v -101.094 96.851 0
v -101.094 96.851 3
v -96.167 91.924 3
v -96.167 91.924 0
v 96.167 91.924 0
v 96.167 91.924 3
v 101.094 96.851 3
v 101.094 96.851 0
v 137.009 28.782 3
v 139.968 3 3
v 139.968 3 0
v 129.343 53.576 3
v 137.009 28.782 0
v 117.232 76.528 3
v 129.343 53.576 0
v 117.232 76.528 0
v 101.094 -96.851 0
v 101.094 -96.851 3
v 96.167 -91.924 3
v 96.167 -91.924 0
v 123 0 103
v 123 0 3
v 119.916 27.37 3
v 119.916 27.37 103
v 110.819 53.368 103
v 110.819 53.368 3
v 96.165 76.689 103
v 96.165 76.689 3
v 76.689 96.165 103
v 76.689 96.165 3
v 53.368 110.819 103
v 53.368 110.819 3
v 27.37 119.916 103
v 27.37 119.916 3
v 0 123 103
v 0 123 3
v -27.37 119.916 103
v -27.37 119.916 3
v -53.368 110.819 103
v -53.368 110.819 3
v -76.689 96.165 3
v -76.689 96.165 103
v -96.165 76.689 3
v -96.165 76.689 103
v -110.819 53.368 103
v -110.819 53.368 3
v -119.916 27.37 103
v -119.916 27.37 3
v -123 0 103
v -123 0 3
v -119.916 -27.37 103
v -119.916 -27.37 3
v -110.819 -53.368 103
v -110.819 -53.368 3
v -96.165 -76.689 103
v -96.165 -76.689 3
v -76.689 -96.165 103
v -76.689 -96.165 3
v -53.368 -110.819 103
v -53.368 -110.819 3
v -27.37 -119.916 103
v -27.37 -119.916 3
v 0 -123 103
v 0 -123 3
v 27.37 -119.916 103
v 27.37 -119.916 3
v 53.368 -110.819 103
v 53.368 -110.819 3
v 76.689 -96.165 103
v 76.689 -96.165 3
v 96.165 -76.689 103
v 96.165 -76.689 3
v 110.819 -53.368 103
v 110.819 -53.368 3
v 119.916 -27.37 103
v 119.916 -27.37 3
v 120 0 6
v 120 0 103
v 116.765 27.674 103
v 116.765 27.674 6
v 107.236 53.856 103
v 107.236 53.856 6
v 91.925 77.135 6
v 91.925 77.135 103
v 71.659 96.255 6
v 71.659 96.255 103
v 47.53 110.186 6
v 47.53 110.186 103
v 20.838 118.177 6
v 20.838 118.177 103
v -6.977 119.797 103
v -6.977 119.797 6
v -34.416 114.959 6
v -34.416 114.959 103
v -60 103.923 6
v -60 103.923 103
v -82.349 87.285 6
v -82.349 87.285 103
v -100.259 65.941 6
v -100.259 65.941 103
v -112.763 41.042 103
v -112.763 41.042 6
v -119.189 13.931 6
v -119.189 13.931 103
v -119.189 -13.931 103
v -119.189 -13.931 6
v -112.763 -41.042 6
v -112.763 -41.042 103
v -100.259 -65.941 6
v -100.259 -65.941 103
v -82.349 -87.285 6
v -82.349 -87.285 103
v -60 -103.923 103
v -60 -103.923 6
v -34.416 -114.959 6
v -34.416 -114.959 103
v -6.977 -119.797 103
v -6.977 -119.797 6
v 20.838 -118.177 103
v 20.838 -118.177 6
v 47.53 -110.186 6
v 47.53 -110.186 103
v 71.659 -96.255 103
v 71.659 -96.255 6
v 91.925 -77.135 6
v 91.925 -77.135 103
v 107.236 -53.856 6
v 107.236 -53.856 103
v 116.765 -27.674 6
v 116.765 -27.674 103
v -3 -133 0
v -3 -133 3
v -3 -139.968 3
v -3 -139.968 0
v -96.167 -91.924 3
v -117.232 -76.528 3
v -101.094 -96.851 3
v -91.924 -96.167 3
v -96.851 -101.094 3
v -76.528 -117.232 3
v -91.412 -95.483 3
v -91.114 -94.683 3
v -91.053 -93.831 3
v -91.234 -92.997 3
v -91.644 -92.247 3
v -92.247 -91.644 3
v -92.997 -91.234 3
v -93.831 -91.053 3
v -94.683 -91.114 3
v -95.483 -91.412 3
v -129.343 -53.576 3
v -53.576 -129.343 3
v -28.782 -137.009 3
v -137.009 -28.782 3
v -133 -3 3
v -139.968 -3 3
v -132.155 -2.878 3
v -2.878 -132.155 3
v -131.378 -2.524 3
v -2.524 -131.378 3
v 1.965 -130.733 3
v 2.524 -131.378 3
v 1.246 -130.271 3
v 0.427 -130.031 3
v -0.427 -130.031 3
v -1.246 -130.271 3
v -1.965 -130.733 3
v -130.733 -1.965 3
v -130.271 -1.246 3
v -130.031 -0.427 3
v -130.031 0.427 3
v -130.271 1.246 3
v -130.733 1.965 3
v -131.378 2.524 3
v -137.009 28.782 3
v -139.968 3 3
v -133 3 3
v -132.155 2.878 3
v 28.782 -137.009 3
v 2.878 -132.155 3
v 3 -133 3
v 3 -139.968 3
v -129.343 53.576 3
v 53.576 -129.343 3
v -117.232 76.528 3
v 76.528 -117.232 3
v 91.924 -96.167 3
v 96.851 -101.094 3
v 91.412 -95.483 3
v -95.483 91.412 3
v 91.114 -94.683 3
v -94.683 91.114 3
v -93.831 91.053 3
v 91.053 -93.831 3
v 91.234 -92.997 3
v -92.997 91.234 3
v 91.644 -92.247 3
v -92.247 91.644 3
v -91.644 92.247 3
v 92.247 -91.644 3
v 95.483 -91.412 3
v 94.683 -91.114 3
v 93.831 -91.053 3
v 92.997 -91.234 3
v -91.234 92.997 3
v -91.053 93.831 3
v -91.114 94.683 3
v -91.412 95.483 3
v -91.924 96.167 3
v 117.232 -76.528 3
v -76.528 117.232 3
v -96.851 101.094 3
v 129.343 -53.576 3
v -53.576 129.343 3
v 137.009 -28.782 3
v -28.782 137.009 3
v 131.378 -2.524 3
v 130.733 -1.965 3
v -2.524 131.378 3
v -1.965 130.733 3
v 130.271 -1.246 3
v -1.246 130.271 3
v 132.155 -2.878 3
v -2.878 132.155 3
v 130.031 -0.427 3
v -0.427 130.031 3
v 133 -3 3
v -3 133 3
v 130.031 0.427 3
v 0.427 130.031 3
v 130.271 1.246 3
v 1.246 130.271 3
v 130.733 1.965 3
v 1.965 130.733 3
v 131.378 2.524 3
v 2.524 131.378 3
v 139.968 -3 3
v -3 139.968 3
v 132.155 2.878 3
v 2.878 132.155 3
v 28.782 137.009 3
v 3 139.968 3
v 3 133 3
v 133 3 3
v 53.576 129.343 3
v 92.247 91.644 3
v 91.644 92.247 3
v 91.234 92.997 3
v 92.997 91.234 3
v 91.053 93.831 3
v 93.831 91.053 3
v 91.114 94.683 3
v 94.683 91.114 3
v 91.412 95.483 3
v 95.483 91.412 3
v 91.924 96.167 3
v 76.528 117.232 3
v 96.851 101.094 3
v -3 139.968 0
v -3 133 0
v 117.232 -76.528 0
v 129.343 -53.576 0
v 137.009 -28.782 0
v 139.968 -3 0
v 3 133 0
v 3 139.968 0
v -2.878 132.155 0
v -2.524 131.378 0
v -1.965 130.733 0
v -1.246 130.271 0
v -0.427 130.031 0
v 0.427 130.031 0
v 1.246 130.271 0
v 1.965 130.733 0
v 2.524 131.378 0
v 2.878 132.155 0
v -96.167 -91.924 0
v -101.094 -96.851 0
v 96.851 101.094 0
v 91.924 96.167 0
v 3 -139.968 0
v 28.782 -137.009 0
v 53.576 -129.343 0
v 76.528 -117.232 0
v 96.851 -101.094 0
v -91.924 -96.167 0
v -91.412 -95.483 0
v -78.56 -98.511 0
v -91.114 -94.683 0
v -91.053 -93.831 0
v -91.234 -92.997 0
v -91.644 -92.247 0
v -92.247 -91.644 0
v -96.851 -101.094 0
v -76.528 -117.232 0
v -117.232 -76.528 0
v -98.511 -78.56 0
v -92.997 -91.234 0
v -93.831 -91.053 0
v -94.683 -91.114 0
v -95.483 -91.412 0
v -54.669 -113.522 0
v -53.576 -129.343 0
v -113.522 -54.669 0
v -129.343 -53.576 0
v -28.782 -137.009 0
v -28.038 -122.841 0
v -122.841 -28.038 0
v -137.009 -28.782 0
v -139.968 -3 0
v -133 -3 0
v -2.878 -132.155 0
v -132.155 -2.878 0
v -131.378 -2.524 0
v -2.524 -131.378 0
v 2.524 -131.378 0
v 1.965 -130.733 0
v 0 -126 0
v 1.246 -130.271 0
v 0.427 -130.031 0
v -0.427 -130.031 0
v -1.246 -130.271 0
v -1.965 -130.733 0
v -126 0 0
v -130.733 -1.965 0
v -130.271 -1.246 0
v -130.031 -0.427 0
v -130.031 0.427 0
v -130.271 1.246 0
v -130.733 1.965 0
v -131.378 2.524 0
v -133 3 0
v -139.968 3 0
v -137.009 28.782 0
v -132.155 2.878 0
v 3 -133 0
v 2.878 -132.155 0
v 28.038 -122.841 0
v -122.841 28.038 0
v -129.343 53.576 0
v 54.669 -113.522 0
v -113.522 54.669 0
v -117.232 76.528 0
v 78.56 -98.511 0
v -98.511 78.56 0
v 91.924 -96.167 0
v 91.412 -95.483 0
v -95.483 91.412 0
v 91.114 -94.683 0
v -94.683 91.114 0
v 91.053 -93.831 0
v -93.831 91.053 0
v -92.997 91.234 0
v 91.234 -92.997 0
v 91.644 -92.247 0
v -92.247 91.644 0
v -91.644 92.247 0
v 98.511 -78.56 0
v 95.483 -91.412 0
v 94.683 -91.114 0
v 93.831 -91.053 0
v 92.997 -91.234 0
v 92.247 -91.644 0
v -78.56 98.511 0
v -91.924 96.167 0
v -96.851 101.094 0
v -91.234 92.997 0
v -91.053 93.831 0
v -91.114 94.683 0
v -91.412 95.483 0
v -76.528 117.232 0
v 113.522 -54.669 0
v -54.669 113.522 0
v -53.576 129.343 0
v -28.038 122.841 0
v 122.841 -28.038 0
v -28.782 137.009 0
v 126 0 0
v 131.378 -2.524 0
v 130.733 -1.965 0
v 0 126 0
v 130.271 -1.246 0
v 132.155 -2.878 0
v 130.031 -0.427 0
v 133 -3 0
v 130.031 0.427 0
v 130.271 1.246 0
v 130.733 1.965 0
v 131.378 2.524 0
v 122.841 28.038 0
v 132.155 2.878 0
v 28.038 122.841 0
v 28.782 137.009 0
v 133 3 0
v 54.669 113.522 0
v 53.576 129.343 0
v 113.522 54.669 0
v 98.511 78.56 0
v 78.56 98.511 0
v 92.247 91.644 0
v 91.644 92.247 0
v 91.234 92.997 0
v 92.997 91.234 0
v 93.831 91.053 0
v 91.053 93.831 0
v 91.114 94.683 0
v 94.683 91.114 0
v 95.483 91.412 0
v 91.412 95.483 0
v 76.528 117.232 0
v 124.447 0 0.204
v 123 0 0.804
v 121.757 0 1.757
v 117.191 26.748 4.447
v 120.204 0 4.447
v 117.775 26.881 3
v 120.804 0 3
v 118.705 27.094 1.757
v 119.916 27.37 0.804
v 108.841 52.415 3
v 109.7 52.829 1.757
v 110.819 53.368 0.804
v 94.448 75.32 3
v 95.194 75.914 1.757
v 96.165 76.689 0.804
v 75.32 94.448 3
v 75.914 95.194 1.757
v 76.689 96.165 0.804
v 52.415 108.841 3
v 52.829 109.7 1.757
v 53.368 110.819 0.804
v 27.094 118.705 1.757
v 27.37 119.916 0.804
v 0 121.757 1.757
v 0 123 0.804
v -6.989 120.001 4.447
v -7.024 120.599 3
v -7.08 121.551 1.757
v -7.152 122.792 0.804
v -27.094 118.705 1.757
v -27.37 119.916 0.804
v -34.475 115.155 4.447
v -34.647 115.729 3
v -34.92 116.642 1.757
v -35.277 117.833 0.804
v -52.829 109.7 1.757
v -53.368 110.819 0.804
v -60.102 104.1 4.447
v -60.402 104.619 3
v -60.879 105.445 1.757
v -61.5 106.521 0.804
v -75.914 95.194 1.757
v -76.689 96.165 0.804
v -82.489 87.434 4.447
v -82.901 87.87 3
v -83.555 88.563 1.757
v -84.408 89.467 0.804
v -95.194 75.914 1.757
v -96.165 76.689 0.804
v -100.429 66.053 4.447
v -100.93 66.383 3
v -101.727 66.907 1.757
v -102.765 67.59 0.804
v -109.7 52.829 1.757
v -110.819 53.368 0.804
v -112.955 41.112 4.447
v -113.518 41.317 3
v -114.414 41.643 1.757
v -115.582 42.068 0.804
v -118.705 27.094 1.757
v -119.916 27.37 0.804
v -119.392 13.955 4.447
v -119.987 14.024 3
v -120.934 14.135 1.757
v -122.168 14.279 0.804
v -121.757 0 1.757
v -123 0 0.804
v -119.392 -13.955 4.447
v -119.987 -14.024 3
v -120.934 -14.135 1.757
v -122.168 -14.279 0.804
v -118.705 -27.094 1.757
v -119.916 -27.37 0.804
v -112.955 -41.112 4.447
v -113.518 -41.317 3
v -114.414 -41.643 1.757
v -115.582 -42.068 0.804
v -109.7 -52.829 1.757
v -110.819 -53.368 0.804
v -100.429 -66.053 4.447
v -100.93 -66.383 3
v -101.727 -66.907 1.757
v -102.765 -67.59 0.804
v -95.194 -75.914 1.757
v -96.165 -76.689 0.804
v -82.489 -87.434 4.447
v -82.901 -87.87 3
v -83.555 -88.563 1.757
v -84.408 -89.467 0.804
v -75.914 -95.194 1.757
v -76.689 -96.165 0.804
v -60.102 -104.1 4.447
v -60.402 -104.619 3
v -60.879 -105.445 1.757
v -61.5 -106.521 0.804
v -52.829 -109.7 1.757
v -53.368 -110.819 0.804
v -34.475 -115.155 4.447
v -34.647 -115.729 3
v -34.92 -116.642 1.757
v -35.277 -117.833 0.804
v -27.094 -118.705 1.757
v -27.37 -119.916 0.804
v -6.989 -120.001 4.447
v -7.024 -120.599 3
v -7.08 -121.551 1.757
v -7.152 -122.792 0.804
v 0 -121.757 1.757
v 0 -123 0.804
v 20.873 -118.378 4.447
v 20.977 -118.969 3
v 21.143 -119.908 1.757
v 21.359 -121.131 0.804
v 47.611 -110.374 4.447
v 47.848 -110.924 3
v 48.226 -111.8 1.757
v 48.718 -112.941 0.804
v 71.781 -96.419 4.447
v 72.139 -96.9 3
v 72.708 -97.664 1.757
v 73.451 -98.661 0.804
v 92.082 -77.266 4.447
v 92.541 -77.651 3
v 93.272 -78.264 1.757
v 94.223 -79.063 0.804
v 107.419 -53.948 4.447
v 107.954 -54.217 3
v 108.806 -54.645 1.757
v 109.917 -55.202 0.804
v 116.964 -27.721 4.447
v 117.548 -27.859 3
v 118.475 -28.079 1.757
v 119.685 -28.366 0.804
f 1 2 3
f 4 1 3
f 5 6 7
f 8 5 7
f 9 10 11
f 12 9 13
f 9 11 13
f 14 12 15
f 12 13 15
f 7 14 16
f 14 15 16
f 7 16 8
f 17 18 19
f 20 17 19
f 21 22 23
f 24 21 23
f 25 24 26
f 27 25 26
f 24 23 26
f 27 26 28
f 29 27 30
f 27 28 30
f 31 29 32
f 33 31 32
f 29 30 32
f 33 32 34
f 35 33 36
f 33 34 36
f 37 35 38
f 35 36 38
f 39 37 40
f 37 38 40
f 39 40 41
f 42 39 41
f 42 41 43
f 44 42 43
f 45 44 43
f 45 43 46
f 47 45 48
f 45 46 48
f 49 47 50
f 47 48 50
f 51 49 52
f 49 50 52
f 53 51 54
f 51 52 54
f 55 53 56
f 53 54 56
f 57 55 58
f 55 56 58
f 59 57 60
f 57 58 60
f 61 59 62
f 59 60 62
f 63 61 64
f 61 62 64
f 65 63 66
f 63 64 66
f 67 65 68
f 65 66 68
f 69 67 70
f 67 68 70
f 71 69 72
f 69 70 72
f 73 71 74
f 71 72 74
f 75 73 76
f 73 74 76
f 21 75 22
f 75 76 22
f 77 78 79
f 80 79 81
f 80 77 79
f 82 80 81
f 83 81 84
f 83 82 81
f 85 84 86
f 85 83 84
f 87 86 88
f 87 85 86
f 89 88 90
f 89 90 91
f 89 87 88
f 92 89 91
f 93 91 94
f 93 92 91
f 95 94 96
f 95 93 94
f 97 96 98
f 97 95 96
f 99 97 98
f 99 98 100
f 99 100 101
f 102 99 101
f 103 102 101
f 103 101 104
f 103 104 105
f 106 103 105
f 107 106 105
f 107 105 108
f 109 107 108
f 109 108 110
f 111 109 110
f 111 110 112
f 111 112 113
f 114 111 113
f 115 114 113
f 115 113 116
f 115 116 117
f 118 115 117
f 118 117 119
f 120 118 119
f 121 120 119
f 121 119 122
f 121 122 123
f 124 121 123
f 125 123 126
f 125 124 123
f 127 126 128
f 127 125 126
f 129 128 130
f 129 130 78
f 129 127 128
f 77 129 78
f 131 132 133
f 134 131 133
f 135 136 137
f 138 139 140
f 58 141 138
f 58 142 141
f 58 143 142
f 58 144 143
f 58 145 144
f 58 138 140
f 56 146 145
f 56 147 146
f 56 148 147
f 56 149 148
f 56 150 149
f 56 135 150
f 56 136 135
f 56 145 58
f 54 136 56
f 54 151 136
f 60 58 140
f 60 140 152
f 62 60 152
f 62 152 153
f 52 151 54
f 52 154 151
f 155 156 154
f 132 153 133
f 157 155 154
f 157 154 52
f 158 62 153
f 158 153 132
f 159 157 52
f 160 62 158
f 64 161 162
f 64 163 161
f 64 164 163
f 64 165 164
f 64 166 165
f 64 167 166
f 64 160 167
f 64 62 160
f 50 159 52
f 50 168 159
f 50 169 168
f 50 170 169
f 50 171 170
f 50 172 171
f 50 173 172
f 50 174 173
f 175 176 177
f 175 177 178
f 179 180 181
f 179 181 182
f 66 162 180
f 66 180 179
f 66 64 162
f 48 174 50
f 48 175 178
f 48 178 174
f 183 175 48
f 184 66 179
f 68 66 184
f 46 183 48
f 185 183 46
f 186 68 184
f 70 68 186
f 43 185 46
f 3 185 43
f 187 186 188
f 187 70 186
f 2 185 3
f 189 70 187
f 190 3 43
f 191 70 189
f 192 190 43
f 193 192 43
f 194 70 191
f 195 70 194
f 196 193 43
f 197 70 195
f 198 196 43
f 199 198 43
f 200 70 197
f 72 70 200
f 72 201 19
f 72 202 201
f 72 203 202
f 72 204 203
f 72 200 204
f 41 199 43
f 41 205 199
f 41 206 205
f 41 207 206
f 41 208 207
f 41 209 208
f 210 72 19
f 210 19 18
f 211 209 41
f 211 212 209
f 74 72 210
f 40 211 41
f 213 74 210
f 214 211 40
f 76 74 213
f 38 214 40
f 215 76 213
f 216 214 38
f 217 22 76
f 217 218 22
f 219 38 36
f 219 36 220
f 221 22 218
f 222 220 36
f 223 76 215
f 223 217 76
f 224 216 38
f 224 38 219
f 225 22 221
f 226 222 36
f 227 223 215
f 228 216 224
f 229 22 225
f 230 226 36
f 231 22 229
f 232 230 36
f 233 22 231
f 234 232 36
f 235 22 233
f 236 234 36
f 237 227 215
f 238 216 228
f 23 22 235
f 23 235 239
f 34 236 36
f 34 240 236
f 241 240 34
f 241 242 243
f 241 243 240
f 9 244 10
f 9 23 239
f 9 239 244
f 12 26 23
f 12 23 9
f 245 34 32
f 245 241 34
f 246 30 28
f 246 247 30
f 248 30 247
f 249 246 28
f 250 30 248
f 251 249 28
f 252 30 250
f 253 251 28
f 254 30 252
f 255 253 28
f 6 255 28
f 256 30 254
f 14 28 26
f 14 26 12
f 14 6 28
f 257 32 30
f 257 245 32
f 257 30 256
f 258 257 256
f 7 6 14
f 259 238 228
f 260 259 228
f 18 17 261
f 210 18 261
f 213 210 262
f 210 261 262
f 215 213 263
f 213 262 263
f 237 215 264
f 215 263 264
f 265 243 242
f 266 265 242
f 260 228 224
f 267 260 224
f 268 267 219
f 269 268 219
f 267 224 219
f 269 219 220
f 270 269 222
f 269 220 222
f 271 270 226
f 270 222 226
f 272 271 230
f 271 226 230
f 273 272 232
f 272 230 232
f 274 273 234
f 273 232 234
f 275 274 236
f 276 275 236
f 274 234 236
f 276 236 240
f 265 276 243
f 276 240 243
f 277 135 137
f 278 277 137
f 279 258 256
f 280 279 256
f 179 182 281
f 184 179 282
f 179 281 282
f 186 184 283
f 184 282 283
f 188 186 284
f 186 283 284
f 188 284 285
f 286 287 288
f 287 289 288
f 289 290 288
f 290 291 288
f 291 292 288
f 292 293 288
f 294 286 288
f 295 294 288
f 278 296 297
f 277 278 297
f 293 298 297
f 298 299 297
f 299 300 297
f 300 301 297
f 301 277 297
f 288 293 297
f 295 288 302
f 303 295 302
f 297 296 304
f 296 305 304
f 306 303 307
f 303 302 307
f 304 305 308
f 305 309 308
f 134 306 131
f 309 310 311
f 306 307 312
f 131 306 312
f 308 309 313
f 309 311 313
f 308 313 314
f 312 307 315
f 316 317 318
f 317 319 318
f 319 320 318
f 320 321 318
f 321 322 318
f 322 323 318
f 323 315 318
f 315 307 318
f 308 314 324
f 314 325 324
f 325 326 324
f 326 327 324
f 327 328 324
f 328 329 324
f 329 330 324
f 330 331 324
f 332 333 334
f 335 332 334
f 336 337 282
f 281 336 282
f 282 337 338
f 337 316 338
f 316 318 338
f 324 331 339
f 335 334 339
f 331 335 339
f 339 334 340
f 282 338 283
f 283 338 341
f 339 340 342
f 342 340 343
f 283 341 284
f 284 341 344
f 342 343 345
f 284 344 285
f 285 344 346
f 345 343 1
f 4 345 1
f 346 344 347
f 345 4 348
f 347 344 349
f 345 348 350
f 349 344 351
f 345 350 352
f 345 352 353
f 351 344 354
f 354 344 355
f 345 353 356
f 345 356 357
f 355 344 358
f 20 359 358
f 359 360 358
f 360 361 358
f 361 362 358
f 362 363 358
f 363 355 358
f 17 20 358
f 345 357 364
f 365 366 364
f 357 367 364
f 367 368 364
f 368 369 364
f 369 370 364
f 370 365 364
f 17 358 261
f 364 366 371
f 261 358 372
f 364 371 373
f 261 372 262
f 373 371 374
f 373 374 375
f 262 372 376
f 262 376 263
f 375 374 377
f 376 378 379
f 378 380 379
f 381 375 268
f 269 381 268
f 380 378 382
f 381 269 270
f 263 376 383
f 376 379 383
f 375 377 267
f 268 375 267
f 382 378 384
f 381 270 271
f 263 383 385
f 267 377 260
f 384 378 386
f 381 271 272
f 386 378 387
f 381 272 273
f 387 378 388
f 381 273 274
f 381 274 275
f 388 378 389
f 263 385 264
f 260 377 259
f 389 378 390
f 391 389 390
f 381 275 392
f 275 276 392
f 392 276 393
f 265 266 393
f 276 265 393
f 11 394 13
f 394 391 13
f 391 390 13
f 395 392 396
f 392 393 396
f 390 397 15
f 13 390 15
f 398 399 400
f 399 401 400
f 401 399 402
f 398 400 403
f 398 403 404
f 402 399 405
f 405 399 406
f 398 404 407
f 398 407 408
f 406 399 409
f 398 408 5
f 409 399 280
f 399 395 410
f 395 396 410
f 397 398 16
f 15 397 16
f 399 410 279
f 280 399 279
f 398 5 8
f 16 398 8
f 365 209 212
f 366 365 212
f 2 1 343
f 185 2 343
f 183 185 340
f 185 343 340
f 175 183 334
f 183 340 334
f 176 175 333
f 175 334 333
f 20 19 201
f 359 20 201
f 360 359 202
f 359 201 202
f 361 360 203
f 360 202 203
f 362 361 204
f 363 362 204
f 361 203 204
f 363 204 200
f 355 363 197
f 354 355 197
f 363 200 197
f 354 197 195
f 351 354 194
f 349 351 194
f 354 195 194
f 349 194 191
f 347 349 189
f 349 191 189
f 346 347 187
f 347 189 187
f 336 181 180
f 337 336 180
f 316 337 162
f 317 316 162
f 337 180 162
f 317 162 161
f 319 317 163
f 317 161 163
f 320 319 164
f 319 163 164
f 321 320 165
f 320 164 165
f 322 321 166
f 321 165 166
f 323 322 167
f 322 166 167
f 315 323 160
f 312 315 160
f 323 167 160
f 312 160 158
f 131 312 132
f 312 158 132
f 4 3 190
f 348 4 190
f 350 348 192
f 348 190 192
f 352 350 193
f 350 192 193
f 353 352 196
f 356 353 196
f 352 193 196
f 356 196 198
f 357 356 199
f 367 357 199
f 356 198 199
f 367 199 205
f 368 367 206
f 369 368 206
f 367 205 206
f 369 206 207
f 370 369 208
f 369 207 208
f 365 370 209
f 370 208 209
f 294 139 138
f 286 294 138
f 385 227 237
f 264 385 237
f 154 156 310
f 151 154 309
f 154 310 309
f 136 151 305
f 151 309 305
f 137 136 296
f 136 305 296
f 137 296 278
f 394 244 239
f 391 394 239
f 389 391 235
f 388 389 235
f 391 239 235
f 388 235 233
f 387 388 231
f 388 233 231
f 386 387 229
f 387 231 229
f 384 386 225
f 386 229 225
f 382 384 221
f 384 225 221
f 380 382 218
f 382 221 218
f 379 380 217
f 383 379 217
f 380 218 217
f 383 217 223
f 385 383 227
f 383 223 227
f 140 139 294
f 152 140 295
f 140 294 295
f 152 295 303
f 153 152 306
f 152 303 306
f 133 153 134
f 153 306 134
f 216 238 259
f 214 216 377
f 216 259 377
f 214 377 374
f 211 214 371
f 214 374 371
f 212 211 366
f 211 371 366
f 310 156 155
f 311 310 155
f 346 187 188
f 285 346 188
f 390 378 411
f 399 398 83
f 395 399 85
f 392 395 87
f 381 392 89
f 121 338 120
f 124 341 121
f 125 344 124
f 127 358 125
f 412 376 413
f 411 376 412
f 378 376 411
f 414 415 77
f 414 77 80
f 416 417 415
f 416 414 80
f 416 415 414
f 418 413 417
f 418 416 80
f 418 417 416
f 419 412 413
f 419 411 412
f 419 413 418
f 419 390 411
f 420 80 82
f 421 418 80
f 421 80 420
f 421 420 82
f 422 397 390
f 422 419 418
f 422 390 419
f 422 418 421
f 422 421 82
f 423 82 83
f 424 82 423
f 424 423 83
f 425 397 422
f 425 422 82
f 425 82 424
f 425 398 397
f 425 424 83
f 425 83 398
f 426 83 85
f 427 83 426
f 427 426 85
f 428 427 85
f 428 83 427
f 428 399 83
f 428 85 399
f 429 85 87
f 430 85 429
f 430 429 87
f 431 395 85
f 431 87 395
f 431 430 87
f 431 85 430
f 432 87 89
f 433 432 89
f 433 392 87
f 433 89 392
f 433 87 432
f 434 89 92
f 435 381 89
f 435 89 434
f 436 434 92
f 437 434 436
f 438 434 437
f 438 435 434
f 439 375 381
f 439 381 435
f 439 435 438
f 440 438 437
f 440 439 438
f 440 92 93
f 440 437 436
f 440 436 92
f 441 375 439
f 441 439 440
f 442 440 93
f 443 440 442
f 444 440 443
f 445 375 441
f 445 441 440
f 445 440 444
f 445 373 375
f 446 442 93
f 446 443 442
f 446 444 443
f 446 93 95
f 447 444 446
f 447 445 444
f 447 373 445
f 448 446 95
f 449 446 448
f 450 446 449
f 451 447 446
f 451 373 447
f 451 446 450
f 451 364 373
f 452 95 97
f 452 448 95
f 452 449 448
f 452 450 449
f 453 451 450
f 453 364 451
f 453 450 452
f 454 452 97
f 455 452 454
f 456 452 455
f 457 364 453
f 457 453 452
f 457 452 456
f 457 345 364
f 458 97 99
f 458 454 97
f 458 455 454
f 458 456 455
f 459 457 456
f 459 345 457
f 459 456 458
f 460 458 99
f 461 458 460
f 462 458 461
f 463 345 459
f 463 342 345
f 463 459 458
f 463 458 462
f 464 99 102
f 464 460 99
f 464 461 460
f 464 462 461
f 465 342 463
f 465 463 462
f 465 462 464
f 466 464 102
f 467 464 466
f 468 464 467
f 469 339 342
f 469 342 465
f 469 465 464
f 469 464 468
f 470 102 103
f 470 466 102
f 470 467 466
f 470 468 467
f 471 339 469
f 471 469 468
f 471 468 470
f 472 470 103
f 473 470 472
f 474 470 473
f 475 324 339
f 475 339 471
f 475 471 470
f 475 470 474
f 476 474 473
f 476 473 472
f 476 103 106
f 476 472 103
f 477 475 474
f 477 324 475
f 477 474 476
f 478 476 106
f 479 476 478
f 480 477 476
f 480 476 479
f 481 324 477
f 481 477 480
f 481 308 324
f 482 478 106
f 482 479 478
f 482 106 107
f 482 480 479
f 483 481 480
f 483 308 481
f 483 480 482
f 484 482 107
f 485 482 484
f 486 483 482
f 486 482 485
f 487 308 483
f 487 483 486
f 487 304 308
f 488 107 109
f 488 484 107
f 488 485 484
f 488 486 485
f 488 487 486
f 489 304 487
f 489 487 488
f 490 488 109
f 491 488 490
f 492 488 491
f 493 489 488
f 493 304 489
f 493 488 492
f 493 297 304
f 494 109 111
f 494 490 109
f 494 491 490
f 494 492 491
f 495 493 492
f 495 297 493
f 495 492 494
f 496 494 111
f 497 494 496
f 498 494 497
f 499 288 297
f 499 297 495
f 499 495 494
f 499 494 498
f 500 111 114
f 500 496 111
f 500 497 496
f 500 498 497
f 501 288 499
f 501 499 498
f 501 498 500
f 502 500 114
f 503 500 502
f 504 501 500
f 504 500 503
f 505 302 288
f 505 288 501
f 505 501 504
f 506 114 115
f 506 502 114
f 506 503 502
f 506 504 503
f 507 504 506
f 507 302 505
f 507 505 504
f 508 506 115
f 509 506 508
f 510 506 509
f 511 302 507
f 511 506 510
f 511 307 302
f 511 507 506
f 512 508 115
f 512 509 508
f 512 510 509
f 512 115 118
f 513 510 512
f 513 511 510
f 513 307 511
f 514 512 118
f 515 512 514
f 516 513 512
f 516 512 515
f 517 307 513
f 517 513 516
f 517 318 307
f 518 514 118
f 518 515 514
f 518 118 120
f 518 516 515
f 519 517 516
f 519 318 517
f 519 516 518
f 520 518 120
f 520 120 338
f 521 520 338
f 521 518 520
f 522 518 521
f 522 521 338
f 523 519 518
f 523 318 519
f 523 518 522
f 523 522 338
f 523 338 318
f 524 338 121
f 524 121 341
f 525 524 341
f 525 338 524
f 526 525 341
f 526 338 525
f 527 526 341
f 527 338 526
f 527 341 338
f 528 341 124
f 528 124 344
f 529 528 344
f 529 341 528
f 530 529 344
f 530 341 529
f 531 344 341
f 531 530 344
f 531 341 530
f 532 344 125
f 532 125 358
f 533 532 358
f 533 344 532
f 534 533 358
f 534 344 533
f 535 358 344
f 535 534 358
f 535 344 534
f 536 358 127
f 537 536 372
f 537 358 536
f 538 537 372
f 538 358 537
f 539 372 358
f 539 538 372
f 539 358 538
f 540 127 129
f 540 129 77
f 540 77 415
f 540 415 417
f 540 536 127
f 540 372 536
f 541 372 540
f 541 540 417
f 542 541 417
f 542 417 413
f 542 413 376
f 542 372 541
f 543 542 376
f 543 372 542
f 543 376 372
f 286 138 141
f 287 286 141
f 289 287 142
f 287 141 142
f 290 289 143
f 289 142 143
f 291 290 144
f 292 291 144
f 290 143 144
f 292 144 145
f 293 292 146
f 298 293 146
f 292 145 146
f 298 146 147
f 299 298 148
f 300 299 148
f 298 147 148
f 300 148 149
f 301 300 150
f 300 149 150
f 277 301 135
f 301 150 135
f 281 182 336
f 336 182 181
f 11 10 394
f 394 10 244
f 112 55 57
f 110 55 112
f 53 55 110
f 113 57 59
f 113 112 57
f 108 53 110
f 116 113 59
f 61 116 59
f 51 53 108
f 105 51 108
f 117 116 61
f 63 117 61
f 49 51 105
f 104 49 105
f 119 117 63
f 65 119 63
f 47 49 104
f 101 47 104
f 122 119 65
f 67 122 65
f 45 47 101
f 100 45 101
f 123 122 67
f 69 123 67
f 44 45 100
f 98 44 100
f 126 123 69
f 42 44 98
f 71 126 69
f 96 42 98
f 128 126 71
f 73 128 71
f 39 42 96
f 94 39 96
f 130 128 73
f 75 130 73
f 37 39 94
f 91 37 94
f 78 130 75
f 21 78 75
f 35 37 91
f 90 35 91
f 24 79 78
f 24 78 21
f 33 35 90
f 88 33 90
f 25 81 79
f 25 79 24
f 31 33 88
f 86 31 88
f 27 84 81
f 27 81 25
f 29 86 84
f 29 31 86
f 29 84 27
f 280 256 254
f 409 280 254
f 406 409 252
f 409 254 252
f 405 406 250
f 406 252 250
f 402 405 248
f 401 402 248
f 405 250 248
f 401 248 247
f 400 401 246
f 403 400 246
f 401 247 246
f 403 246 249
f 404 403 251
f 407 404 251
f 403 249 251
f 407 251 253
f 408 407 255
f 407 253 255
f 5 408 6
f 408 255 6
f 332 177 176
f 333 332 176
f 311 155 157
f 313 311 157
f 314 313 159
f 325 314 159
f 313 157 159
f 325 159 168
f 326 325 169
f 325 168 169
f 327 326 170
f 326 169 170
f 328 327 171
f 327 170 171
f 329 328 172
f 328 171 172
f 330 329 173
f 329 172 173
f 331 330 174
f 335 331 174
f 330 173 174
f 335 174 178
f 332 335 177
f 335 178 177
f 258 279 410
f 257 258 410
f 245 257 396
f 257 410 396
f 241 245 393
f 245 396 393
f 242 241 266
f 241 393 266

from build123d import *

# Parameters (mm, degrees)
F0_R     = 140
F0_R_2   = 120
F1_DEPTH = 3
F2_R     = 123
F2_R_2   = 120
F3_DEPTH = 100
F4_R     = 6
F6_DEPTH = 3.0010001


with BuildPart() as f1:
    # F0 (on Top) → F1 (new body)
    with BuildSketch(Plane.XY):
        Circle(F0_R)
        Circle(F0_R_2, mode=Mode.SUBTRACT)
    extrude(amount=F1_DEPTH)

    # F2 (on face) → F3 (join)
    with BuildSketch(Plane.XY.offset(3)):
        Circle(F2_R)
        Circle(F2_R_2, mode=Mode.SUBTRACT)
    extrude(amount=F3_DEPTH)

    # F4
    f4_edges = [f1.edges().sort_by_distance(p)[0] for p in [
        (-120, 0, 0),
    ]]
    fillet(f4_edges, radius=F4_R)

    # F5 (on face) → F6 (cut, through all)
    with BuildSketch(Plane.XY.offset(3)):
        with BuildLine():
            ThreePointArc((-101.0935386677, -96.8508979806), (-98.9949493661, -98.9949493661), (-96.8508979806, -101.0935386677))
            Line((-96.8508979806, -101.0935386677), (-91.9238815543, -96.1665222414))
            ThreePointArc((-91.9238815543, -96.1665222414), (-91.9238815543, -91.9238815543), (-96.1665222414, -91.9238815543))
            Line((-96.1665222414, -91.9238815543), (-101.0935386677, -96.8508979806))
        make_face()
        with BuildLine():
            ThreePointArc((0, -140), (1.5000861142, -139.9919631324), (3, -139.9678534521))
            Line((3, -139.9678534521), (3, -133))
            ThreePointArc((3, -133), (0, -130), (-3, -133))
            Line((-3, -133), (-3, -139.9678534521))
            ThreePointArc((-3, -139.9678534521), (-1.5000861142, -139.9919631324), (0, -140))
        make_face()
        with BuildLine():
            Line((-133, 3), (-139.9678534521, 3))
            ThreePointArc((-139.9678534521, 3), (-140, 0), (-139.9678534521, -3))
            Line((-139.9678534521, -3), (-133, -3))
            ThreePointArc((-133, -3), (-130, 0), (-133, 3))
        make_face()
        with BuildLine():
            Line((-91.9238815543, 96.1665222414), (-96.8508979806, 101.0935386677))
            ThreePointArc((-96.8508979806, 101.0935386677), (-98.9949493661, 98.9949493661), (-101.0935386677, 96.8508979806))
            Line((-101.0935386677, 96.8508979806), (-96.1665222414, 91.9238815543))
            ThreePointArc((-96.1665222414, 91.9238815543), (-91.9238815543, 91.9238815543), (-91.9238815543, 96.1665222414))
        make_face()
        with BuildLine():
            Line((3, 133), (3, 139.9678534521))
            ThreePointArc((3, 139.9678534521), (0, 140), (-3, 139.9678534521))
            Line((-3, 139.9678534521), (-3, 133))
            ThreePointArc((-3, 133), (0, 130), (3, 133))
        make_face()
        with BuildLine():
            ThreePointArc((96.8508979806, -101.0935386677), (98.9949493661, -98.9949493661), (101.0935386677, -96.8508979806))
            Line((101.0935386677, -96.8508979806), (96.1665222414, -91.9238815543))
            ThreePointArc((96.1665222414, -91.9238815543), (91.9238815543, -91.9238815543), (91.9238815543, -96.1665222414))
            Line((91.9238815543, -96.1665222414), (96.8508979806, -101.0935386677))
        make_face()
        with BuildLine():
            ThreePointArc((139.9678534521, -3), (139.9919631324, -1.5000861142), (140, 0))
            ThreePointArc((140, 0), (139.9919631324, 1.5000861142), (139.9678534521, 3))
            Line((139.9678534521, 3), (133, 3))
            ThreePointArc((133, 3), (130, 0), (133, -3))
            Line((133, -3), (139.9678534521, -3))
        make_face()
        with BuildLine():
            Line((96.1665222414, 91.9238815543), (101.0935386677, 96.8508979806))
            ThreePointArc((101.0935386677, 96.8508979806), (98.9949493661, 98.9949493661), (96.8508979806, 101.0935386677))
            Line((96.8508979806, 101.0935386677), (91.9238815543, 96.1665222414))
            ThreePointArc((91.9238815543, 96.1665222414), (91.9238815543, 91.9238815543), (96.1665222414, 91.9238815543))
        make_face()
    extrude(amount=-F6_DEPTH, mode=Mode.SUBTRACT)


solid = f1.part
